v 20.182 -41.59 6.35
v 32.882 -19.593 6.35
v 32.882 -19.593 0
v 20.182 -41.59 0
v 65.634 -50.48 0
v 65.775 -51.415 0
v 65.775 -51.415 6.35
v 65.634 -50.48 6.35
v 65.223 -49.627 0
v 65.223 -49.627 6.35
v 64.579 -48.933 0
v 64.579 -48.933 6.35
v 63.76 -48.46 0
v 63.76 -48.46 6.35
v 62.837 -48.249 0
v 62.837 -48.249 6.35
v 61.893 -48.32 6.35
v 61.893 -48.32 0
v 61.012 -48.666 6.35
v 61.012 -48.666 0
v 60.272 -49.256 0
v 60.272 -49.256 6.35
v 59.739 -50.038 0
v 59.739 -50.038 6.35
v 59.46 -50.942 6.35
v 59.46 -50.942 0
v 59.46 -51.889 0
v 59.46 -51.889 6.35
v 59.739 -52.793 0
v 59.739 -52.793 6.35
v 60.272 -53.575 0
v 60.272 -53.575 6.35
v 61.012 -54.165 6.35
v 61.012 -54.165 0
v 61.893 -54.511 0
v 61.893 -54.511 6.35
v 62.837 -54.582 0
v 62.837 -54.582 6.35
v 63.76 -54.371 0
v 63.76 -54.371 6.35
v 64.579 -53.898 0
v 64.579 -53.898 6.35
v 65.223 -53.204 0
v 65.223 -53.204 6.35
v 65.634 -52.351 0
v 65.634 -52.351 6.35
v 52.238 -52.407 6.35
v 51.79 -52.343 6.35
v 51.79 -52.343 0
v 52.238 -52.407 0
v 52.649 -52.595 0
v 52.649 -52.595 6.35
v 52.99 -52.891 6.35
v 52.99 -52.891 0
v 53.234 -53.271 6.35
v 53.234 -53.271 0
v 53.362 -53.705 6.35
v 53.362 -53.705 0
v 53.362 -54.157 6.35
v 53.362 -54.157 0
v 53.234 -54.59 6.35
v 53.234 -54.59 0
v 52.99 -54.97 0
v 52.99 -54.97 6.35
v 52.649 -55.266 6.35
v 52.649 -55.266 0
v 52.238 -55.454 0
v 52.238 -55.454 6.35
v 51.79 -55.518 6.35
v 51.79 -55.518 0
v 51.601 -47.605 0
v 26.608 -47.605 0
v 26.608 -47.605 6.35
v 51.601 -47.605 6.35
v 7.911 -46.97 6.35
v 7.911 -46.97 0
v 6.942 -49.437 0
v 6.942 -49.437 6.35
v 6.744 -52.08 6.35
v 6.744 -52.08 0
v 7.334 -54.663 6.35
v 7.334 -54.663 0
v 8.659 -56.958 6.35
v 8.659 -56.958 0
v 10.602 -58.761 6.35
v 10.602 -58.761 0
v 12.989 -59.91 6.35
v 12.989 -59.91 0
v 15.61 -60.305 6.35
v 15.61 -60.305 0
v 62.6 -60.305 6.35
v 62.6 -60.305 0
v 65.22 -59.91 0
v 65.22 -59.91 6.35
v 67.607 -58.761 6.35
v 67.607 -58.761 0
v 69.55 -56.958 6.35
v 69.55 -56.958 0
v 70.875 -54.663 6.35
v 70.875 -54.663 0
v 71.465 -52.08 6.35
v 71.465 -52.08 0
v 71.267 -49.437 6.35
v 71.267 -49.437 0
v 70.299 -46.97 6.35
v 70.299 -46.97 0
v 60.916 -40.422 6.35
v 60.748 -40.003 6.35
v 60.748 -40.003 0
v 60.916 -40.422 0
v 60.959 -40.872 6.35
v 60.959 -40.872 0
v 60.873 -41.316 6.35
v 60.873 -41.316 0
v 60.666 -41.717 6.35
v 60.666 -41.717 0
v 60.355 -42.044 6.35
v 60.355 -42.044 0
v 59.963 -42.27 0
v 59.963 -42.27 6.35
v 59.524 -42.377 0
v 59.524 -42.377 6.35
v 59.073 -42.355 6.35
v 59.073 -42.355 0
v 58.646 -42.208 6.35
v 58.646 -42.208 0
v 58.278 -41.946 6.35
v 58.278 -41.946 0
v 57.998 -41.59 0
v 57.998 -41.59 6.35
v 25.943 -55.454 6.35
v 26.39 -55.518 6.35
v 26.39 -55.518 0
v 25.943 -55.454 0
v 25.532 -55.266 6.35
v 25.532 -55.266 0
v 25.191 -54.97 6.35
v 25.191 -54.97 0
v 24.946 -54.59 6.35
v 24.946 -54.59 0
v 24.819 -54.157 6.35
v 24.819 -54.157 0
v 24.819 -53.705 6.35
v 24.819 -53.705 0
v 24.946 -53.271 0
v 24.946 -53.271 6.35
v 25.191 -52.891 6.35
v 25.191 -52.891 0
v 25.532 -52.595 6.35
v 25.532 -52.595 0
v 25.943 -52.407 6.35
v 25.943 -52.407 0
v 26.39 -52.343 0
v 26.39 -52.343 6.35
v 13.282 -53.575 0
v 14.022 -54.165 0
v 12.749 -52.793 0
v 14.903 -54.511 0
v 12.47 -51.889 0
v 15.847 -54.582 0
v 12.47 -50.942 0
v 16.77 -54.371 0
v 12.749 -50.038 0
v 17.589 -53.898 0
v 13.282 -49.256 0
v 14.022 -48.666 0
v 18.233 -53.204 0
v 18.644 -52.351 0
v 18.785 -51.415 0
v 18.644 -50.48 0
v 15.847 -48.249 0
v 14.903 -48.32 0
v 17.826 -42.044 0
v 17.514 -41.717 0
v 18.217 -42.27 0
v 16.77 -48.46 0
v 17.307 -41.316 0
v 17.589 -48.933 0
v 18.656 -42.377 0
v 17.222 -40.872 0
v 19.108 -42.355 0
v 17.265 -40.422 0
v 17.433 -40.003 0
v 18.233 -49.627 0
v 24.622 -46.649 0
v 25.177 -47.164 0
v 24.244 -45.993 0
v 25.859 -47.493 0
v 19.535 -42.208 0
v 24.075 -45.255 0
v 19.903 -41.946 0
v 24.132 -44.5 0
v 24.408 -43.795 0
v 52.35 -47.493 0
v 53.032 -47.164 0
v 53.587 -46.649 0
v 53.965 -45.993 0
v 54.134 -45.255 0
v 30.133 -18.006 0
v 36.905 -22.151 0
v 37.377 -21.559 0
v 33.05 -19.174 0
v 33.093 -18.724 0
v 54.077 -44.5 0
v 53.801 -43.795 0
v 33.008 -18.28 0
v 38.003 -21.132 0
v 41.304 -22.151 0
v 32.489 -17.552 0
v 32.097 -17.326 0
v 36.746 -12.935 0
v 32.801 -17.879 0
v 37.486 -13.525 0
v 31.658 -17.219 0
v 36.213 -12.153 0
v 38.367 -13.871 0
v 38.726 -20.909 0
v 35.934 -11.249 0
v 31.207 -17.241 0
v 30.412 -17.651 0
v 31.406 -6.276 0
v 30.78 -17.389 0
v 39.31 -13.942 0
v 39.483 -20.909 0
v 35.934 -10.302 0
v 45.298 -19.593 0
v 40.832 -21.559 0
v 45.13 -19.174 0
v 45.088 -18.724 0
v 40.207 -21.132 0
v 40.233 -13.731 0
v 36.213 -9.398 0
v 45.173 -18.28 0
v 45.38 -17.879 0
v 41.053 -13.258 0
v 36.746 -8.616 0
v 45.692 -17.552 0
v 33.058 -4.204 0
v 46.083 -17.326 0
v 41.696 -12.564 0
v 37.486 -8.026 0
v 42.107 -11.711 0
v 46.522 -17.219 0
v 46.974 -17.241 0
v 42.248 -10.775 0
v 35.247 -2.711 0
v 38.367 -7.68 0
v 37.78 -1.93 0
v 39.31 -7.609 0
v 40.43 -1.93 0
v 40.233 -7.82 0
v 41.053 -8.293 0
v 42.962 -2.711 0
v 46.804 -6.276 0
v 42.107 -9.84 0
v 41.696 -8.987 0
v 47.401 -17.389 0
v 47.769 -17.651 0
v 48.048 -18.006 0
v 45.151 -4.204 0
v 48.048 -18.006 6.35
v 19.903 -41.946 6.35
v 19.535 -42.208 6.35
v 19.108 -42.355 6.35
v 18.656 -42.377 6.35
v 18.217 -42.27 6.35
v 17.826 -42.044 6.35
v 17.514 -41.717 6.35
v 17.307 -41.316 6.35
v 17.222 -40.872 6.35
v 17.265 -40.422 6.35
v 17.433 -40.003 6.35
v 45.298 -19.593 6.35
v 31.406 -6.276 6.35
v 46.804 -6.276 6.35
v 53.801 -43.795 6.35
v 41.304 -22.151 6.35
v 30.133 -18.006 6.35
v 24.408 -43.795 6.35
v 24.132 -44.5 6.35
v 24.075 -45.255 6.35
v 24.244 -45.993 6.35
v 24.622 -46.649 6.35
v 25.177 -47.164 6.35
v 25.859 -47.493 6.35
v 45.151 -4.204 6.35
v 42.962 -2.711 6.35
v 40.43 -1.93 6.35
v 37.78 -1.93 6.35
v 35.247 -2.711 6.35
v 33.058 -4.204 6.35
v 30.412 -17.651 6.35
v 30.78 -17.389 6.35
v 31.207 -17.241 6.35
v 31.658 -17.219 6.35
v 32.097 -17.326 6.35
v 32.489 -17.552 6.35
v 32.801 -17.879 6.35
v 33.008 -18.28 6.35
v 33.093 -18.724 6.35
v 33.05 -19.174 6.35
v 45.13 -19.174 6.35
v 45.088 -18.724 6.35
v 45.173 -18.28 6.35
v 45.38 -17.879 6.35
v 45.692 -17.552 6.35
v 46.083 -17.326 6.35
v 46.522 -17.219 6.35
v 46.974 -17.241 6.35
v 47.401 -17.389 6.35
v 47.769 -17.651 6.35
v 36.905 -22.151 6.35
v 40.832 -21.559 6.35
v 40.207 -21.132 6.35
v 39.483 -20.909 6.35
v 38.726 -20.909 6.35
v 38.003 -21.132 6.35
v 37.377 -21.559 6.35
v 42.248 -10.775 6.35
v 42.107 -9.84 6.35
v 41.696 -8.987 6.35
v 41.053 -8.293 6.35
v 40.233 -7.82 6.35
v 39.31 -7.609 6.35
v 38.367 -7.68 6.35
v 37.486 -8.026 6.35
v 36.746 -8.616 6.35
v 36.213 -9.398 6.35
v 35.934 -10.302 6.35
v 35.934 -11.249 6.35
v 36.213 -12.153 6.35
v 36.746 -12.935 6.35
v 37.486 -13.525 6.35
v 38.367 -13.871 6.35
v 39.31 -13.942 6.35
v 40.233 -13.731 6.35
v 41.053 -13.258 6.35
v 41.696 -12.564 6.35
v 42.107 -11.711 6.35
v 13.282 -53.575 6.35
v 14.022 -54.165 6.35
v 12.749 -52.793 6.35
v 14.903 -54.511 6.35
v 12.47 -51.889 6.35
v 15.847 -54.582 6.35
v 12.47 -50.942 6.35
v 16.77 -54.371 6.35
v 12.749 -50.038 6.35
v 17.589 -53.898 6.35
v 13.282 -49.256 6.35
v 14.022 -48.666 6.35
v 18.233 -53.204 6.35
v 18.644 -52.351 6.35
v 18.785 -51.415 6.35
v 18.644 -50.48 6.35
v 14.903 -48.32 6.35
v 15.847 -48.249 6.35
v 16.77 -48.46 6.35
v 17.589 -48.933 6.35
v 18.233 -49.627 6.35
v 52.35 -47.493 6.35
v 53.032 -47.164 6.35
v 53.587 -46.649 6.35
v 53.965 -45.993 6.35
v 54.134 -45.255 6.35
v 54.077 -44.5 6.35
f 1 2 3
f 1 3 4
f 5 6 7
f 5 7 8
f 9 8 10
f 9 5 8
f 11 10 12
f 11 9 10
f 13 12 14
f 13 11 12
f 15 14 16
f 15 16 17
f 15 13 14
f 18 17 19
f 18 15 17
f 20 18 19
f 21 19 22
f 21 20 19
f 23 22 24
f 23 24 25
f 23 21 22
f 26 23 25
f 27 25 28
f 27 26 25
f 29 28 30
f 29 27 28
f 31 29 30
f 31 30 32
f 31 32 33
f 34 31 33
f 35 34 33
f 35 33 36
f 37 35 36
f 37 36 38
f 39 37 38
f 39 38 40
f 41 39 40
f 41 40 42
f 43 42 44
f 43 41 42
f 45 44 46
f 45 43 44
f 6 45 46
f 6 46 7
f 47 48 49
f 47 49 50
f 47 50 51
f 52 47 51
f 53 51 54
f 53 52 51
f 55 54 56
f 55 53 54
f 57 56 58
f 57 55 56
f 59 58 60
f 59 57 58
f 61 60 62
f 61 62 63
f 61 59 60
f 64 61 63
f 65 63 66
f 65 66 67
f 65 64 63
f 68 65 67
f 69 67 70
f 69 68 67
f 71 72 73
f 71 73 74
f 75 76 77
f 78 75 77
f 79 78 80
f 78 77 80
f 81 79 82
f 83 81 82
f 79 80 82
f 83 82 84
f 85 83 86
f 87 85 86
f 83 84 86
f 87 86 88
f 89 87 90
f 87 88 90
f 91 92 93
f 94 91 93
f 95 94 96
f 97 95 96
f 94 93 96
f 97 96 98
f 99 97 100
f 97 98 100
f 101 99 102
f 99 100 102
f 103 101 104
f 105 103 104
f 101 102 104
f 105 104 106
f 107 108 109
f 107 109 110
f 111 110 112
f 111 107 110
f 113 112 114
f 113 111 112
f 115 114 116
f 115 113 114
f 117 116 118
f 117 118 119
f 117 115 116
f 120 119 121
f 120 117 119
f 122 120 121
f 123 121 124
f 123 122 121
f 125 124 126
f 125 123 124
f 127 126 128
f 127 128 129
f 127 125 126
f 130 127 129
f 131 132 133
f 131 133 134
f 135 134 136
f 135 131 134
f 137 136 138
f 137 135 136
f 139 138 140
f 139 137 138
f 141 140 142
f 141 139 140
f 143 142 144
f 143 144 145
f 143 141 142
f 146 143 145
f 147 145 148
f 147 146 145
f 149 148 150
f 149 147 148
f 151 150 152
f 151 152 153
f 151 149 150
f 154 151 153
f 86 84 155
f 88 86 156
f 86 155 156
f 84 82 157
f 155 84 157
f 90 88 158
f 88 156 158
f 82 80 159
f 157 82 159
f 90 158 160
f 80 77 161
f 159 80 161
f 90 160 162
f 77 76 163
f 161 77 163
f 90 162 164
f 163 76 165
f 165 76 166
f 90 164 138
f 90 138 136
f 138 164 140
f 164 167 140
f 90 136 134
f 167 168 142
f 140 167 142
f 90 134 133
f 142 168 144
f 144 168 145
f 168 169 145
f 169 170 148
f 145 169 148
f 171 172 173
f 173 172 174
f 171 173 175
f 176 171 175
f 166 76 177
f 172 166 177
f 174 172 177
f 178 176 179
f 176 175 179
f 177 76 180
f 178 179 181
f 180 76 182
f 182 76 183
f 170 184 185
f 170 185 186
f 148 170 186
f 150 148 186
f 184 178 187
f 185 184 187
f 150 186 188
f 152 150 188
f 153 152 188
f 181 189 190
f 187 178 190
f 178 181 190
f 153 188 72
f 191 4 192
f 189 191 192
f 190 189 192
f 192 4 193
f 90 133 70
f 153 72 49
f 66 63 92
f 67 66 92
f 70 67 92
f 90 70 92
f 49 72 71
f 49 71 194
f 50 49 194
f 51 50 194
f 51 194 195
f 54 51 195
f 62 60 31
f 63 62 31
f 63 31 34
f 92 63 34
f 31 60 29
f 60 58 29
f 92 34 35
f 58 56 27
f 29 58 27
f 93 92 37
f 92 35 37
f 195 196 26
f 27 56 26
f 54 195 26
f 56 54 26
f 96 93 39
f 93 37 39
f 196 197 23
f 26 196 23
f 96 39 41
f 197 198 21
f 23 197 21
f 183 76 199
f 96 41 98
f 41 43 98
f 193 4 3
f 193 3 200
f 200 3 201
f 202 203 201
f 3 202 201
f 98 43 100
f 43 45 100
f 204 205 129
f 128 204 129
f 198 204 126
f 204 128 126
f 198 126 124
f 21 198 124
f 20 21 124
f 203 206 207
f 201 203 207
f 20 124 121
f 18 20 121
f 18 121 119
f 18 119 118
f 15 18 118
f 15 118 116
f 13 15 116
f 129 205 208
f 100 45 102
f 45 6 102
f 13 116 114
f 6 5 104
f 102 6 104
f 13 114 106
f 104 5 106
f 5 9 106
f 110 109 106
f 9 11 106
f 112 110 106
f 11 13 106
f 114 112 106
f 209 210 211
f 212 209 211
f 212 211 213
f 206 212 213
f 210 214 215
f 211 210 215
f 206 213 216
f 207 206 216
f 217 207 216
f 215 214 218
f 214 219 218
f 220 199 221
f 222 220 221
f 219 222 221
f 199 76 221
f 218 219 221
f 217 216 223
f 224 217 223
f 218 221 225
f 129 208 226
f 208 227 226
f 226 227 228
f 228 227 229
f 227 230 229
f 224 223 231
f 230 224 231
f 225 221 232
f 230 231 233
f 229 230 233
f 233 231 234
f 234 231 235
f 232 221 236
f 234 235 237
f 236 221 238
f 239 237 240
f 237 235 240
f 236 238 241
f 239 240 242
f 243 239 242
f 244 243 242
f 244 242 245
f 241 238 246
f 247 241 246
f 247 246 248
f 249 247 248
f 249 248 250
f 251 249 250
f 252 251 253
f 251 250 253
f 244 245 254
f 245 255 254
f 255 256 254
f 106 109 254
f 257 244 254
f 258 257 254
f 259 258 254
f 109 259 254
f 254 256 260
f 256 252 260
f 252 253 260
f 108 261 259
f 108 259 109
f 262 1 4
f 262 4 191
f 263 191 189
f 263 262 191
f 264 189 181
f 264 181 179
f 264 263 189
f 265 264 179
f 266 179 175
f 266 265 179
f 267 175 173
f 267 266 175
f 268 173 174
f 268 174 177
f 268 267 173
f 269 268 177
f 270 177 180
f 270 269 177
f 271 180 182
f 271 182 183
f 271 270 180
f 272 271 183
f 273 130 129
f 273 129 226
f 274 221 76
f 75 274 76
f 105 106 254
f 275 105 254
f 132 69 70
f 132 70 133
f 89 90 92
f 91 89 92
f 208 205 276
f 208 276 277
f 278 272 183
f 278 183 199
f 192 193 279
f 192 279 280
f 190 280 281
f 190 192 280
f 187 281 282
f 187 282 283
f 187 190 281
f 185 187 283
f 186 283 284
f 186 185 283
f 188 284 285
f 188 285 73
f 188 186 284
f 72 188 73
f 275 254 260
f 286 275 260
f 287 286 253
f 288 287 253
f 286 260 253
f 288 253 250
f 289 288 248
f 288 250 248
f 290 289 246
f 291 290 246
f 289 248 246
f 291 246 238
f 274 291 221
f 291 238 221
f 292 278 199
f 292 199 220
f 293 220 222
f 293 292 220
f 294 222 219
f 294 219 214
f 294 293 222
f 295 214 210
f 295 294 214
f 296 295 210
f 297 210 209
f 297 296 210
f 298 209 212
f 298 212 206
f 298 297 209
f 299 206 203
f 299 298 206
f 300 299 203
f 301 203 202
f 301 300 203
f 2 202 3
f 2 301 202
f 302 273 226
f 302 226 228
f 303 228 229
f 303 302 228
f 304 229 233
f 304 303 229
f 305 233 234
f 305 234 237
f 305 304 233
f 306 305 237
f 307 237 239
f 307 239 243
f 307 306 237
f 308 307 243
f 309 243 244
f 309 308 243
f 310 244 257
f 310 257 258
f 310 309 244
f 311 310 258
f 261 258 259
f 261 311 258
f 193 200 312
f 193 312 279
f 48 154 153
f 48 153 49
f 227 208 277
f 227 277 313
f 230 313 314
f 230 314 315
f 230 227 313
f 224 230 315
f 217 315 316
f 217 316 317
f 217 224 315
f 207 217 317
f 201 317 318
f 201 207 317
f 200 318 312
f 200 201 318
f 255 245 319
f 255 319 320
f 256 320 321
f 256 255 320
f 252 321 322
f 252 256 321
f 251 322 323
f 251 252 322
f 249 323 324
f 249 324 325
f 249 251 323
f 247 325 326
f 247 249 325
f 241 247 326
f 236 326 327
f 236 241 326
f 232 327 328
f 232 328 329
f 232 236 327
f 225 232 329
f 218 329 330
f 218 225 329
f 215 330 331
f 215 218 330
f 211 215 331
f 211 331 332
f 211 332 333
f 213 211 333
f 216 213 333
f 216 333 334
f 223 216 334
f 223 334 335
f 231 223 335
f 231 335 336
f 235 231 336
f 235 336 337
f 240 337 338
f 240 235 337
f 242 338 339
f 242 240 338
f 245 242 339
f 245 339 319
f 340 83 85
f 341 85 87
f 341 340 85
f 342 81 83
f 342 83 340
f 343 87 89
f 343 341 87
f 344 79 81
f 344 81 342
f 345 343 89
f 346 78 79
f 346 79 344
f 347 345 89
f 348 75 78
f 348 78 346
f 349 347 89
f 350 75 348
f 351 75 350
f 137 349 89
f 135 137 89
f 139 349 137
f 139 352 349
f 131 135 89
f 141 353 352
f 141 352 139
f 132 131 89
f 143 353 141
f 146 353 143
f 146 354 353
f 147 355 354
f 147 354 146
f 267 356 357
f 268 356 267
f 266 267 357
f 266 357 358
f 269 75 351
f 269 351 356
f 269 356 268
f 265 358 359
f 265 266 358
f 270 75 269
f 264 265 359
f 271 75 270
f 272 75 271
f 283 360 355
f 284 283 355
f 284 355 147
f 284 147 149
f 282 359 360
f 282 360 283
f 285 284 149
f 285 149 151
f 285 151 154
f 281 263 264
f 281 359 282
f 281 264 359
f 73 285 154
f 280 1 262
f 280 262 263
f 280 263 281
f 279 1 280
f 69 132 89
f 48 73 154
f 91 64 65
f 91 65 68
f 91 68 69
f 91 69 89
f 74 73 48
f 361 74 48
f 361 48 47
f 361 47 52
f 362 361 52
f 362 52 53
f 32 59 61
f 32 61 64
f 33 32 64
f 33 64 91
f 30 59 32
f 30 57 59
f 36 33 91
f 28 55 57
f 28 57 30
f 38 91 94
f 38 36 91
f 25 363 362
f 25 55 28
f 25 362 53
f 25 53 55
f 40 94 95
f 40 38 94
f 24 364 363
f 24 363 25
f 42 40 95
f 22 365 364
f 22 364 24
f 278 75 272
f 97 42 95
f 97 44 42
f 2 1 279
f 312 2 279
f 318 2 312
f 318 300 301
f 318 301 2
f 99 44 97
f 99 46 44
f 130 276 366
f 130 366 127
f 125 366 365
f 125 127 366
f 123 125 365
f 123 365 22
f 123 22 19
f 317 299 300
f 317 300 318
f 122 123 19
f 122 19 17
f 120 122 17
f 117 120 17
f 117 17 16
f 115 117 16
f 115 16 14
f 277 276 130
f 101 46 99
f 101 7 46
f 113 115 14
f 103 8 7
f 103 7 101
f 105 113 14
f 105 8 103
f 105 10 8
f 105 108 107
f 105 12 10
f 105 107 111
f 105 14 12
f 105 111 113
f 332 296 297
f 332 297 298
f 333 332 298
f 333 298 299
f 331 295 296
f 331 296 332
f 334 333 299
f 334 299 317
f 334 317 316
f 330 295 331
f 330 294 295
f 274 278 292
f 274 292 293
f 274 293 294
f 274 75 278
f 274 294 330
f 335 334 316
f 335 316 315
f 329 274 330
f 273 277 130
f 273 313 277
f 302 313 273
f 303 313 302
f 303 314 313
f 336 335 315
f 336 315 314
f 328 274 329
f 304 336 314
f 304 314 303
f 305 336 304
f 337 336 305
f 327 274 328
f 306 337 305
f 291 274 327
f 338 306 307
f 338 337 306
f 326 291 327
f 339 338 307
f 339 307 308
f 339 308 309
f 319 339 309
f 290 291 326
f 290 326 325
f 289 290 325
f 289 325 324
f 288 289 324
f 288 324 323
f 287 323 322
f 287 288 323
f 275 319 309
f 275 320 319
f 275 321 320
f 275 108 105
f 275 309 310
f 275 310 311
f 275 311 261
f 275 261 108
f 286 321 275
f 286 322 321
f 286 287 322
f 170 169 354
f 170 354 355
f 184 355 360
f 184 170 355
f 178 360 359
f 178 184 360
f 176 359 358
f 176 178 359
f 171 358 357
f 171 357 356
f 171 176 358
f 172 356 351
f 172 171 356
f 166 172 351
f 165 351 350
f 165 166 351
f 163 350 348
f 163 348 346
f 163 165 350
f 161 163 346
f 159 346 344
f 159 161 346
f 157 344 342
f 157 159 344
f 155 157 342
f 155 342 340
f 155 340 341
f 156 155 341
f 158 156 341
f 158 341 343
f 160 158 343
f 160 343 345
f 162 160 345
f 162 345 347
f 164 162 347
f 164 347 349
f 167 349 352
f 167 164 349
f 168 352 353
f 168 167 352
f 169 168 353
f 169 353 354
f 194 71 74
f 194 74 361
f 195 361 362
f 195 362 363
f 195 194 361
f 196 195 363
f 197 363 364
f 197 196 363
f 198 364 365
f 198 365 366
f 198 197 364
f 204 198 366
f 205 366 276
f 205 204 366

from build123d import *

# Parameters (mm, degrees)
SKETCH1_R           = 4.7625
BOSS_EXTRUDE1_DEPTH = 6.35
BOSS_EXTRUDE2_START = -6.35
SKETCH2_R           = 4.7625
SKETCH2_R_2         = 3.175
BOSS_EXTRUDE2_DEPTH = 6.35
CUT_EXTRUDE1_DEPTH  = 6.35


with BuildPart() as part:
    # Sketch1 → Boss-Extrude1 (new body)
    with BuildSketch(Plane.XY):
        with BuildLine():
            Line((31.405613519, -6.275848049), (7.910613519, -46.970381773))
            ThreePointArc((7.910613519, -46.970381773), (7.910613519, -55.860381773), (15.609579358, -60.305381773))
            Line((15.609579358, -60.305381773), (62.599579358, -60.305381773))
            ThreePointArc((62.599579358, -60.305381773), (70.298545198, -55.860381773), (70.298545198, -46.970381773))
            Line((70.298545198, -46.970381773), (46.803545198, -6.275848049))
            ThreePointArc((46.803545198, -6.275848049), (39.104579358, -1.830848049), (31.405613519, -6.275848049))
        make_face()
        with Locations((39.073094298, -10.775381773)):
            Circle(SKETCH1_R, mode=Mode.SUBTRACT)
        with Locations((15.609579358, -51.415381773)):
            Circle(SKETCH1_R, mode=Mode.SUBTRACT)
        with Locations((62.599579358, -51.415381773)):
            Circle(SKETCH1_R, mode=Mode.SUBTRACT)
        with BuildLine():
            Line((36.904874833, -22.150848049), (24.408397461, -43.795381773))
            ThreePointArc((24.408397461, -43.795381773), (24.408397461, -46.335381773), (26.608101987, -47.605381773))
            Line((26.608101987, -47.605381773), (51.60105673, -47.605381773))
            ThreePointArc((51.60105673, -47.605381773), (53.800761256, -46.335381773), (53.800761256, -43.795381773))
            Line((53.800761256, -43.795381773), (41.304283884, -22.150848049))
            ThreePointArc((41.304283884, -22.150848049), (39.104579358, -20.880848049), (36.904874833, -22.150848049))
        make_face(mode=Mode.SUBTRACT)
    extrude(amount=BOSS_EXTRUDE1_DEPTH)

    # Sketch2 → Boss-Extrude2 (add)
    # profile 1 of 3: a face of its own
    with BuildSketch(Plane.XY.offset(6.35).offset(BOSS_EXTRUDE2_START)):
        with Locations((39.073094298, -10.775381773)):
            Circle(SKETCH2_R)
        with Locations((39.073094298, -10.775381773)):
            Circle(SKETCH2_R_2, mode=Mode.SUBTRACT)
    # profile 2 of 3: a face of its own
    with BuildSketch(Plane.XY.offset(6.35).offset(BOSS_EXTRUDE2_START)):
        with Locations((62.599579358, -51.415381773)):
            Circle(SKETCH2_R)
        with Locations((62.599579358, -51.415381773)):
            Circle(SKETCH2_R_2, mode=Mode.SUBTRACT)
    # profile 3 of 3: a face of its own
    with BuildSketch(Plane.XY.offset(6.35).offset(BOSS_EXTRUDE2_START)):
        with Locations((15.609579358, -51.415381773)):
            Circle(SKETCH2_R)
        with Locations((15.609579358, -51.415381773)):
            Circle(SKETCH2_R_2, mode=Mode.SUBTRACT)
    extrude(amount=BOSS_EXTRUDE2_DEPTH)

    # Sketch3 → Cut-Extrude1 (cut)
    with BuildSketch(Plane.XY.offset(6.35)):
        with BuildLine():
            Line((30.132559504, -18.005842283), (17.432559504, -40.002887539))
            ThreePointArc((17.432559504, -40.002887539), (18.013624833, -42.171452868), (20.182190161, -41.590387539))
            Line((20.182190161, -41.590387539), (32.882190161, -19.593342283))
            ThreePointArc((32.882190161, -19.593342283), (33.040782082, -18.388717049), (32.301124833, -17.424776955))
            ThreePointArc((32.301124833, -17.424776955), (31.096499599, -17.266185034), (30.132559504, -18.005842283))
        make_face()
        with BuildLine():
            Line((60.748040695, -40.002887539), (48.048040695, -18.005842283))
            ThreePointArc((48.048040695, -18.005842283), (45.879475366, -17.424776955), (45.298410038, -19.593342283))
            Line((45.298410038, -19.593342283), (57.998410038, -41.590387539))
            ThreePointArc((57.998410038, -41.590387539), (60.166975366, -42.171452868), (60.748040695, -40.002887539))
        make_face()
        with BuildLine():
            Line((26.390300099, -55.518149371), (51.790300099, -55.518149371))
            ThreePointArc((51.790300099, -55.518149371), (53.377800099, -53.930649371), (51.790300099, -52.343149371))
            Line((51.790300099, -52.343149371), (26.390300099, -52.343149371))
            ThreePointArc((26.390300099, -52.343149371), (24.802800099, -53.930649371), (26.390300099, -55.518149371))
        make_face()
    extrude(amount=-CUT_EXTRUDE1_DEPTH, mode=Mode.SUBTRACT)


solid = part.part
